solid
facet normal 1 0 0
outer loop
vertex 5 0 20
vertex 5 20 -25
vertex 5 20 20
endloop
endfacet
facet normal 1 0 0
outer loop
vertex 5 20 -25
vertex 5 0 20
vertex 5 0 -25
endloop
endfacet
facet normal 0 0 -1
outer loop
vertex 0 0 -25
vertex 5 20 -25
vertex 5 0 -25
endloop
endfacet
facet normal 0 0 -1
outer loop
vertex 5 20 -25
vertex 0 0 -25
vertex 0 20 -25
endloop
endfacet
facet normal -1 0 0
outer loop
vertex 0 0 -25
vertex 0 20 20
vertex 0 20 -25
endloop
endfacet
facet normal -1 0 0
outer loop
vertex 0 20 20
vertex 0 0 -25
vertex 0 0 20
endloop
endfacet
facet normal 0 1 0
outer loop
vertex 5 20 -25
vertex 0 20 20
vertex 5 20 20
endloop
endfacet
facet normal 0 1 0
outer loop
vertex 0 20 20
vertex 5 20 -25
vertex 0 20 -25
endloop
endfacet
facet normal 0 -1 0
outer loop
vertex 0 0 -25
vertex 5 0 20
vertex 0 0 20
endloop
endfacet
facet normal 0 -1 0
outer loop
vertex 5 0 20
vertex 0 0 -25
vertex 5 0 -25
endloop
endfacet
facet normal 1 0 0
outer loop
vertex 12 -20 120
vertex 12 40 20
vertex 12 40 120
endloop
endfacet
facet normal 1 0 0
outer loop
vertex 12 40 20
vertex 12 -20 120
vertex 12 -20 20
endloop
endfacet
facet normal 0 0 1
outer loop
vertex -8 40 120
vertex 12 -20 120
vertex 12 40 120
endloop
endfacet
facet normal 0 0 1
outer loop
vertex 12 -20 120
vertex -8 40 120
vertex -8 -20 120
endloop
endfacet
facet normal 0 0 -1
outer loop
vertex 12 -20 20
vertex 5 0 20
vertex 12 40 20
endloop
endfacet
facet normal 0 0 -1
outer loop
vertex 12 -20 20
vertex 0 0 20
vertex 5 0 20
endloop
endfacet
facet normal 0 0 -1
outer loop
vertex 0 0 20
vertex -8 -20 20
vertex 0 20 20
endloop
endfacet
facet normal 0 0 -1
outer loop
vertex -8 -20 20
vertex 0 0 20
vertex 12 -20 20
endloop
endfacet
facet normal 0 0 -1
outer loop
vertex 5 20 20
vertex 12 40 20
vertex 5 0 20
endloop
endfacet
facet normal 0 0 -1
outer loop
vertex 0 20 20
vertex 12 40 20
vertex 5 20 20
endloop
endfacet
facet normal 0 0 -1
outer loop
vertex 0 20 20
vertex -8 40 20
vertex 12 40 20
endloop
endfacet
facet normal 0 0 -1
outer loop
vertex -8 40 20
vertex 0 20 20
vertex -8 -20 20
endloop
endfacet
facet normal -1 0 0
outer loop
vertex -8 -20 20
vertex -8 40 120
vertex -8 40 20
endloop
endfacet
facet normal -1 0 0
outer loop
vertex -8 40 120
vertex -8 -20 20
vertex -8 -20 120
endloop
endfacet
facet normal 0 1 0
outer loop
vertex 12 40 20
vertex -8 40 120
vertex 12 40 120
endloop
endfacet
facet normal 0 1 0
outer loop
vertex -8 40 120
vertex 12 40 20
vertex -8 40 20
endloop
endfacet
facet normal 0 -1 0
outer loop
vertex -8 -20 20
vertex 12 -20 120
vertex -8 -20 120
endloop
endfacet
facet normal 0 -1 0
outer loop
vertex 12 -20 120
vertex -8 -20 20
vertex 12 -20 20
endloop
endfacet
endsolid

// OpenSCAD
translate([0,0,-25])cube([5,20,80]);
translate([-8,-20,20])cube([20,60,100]);
